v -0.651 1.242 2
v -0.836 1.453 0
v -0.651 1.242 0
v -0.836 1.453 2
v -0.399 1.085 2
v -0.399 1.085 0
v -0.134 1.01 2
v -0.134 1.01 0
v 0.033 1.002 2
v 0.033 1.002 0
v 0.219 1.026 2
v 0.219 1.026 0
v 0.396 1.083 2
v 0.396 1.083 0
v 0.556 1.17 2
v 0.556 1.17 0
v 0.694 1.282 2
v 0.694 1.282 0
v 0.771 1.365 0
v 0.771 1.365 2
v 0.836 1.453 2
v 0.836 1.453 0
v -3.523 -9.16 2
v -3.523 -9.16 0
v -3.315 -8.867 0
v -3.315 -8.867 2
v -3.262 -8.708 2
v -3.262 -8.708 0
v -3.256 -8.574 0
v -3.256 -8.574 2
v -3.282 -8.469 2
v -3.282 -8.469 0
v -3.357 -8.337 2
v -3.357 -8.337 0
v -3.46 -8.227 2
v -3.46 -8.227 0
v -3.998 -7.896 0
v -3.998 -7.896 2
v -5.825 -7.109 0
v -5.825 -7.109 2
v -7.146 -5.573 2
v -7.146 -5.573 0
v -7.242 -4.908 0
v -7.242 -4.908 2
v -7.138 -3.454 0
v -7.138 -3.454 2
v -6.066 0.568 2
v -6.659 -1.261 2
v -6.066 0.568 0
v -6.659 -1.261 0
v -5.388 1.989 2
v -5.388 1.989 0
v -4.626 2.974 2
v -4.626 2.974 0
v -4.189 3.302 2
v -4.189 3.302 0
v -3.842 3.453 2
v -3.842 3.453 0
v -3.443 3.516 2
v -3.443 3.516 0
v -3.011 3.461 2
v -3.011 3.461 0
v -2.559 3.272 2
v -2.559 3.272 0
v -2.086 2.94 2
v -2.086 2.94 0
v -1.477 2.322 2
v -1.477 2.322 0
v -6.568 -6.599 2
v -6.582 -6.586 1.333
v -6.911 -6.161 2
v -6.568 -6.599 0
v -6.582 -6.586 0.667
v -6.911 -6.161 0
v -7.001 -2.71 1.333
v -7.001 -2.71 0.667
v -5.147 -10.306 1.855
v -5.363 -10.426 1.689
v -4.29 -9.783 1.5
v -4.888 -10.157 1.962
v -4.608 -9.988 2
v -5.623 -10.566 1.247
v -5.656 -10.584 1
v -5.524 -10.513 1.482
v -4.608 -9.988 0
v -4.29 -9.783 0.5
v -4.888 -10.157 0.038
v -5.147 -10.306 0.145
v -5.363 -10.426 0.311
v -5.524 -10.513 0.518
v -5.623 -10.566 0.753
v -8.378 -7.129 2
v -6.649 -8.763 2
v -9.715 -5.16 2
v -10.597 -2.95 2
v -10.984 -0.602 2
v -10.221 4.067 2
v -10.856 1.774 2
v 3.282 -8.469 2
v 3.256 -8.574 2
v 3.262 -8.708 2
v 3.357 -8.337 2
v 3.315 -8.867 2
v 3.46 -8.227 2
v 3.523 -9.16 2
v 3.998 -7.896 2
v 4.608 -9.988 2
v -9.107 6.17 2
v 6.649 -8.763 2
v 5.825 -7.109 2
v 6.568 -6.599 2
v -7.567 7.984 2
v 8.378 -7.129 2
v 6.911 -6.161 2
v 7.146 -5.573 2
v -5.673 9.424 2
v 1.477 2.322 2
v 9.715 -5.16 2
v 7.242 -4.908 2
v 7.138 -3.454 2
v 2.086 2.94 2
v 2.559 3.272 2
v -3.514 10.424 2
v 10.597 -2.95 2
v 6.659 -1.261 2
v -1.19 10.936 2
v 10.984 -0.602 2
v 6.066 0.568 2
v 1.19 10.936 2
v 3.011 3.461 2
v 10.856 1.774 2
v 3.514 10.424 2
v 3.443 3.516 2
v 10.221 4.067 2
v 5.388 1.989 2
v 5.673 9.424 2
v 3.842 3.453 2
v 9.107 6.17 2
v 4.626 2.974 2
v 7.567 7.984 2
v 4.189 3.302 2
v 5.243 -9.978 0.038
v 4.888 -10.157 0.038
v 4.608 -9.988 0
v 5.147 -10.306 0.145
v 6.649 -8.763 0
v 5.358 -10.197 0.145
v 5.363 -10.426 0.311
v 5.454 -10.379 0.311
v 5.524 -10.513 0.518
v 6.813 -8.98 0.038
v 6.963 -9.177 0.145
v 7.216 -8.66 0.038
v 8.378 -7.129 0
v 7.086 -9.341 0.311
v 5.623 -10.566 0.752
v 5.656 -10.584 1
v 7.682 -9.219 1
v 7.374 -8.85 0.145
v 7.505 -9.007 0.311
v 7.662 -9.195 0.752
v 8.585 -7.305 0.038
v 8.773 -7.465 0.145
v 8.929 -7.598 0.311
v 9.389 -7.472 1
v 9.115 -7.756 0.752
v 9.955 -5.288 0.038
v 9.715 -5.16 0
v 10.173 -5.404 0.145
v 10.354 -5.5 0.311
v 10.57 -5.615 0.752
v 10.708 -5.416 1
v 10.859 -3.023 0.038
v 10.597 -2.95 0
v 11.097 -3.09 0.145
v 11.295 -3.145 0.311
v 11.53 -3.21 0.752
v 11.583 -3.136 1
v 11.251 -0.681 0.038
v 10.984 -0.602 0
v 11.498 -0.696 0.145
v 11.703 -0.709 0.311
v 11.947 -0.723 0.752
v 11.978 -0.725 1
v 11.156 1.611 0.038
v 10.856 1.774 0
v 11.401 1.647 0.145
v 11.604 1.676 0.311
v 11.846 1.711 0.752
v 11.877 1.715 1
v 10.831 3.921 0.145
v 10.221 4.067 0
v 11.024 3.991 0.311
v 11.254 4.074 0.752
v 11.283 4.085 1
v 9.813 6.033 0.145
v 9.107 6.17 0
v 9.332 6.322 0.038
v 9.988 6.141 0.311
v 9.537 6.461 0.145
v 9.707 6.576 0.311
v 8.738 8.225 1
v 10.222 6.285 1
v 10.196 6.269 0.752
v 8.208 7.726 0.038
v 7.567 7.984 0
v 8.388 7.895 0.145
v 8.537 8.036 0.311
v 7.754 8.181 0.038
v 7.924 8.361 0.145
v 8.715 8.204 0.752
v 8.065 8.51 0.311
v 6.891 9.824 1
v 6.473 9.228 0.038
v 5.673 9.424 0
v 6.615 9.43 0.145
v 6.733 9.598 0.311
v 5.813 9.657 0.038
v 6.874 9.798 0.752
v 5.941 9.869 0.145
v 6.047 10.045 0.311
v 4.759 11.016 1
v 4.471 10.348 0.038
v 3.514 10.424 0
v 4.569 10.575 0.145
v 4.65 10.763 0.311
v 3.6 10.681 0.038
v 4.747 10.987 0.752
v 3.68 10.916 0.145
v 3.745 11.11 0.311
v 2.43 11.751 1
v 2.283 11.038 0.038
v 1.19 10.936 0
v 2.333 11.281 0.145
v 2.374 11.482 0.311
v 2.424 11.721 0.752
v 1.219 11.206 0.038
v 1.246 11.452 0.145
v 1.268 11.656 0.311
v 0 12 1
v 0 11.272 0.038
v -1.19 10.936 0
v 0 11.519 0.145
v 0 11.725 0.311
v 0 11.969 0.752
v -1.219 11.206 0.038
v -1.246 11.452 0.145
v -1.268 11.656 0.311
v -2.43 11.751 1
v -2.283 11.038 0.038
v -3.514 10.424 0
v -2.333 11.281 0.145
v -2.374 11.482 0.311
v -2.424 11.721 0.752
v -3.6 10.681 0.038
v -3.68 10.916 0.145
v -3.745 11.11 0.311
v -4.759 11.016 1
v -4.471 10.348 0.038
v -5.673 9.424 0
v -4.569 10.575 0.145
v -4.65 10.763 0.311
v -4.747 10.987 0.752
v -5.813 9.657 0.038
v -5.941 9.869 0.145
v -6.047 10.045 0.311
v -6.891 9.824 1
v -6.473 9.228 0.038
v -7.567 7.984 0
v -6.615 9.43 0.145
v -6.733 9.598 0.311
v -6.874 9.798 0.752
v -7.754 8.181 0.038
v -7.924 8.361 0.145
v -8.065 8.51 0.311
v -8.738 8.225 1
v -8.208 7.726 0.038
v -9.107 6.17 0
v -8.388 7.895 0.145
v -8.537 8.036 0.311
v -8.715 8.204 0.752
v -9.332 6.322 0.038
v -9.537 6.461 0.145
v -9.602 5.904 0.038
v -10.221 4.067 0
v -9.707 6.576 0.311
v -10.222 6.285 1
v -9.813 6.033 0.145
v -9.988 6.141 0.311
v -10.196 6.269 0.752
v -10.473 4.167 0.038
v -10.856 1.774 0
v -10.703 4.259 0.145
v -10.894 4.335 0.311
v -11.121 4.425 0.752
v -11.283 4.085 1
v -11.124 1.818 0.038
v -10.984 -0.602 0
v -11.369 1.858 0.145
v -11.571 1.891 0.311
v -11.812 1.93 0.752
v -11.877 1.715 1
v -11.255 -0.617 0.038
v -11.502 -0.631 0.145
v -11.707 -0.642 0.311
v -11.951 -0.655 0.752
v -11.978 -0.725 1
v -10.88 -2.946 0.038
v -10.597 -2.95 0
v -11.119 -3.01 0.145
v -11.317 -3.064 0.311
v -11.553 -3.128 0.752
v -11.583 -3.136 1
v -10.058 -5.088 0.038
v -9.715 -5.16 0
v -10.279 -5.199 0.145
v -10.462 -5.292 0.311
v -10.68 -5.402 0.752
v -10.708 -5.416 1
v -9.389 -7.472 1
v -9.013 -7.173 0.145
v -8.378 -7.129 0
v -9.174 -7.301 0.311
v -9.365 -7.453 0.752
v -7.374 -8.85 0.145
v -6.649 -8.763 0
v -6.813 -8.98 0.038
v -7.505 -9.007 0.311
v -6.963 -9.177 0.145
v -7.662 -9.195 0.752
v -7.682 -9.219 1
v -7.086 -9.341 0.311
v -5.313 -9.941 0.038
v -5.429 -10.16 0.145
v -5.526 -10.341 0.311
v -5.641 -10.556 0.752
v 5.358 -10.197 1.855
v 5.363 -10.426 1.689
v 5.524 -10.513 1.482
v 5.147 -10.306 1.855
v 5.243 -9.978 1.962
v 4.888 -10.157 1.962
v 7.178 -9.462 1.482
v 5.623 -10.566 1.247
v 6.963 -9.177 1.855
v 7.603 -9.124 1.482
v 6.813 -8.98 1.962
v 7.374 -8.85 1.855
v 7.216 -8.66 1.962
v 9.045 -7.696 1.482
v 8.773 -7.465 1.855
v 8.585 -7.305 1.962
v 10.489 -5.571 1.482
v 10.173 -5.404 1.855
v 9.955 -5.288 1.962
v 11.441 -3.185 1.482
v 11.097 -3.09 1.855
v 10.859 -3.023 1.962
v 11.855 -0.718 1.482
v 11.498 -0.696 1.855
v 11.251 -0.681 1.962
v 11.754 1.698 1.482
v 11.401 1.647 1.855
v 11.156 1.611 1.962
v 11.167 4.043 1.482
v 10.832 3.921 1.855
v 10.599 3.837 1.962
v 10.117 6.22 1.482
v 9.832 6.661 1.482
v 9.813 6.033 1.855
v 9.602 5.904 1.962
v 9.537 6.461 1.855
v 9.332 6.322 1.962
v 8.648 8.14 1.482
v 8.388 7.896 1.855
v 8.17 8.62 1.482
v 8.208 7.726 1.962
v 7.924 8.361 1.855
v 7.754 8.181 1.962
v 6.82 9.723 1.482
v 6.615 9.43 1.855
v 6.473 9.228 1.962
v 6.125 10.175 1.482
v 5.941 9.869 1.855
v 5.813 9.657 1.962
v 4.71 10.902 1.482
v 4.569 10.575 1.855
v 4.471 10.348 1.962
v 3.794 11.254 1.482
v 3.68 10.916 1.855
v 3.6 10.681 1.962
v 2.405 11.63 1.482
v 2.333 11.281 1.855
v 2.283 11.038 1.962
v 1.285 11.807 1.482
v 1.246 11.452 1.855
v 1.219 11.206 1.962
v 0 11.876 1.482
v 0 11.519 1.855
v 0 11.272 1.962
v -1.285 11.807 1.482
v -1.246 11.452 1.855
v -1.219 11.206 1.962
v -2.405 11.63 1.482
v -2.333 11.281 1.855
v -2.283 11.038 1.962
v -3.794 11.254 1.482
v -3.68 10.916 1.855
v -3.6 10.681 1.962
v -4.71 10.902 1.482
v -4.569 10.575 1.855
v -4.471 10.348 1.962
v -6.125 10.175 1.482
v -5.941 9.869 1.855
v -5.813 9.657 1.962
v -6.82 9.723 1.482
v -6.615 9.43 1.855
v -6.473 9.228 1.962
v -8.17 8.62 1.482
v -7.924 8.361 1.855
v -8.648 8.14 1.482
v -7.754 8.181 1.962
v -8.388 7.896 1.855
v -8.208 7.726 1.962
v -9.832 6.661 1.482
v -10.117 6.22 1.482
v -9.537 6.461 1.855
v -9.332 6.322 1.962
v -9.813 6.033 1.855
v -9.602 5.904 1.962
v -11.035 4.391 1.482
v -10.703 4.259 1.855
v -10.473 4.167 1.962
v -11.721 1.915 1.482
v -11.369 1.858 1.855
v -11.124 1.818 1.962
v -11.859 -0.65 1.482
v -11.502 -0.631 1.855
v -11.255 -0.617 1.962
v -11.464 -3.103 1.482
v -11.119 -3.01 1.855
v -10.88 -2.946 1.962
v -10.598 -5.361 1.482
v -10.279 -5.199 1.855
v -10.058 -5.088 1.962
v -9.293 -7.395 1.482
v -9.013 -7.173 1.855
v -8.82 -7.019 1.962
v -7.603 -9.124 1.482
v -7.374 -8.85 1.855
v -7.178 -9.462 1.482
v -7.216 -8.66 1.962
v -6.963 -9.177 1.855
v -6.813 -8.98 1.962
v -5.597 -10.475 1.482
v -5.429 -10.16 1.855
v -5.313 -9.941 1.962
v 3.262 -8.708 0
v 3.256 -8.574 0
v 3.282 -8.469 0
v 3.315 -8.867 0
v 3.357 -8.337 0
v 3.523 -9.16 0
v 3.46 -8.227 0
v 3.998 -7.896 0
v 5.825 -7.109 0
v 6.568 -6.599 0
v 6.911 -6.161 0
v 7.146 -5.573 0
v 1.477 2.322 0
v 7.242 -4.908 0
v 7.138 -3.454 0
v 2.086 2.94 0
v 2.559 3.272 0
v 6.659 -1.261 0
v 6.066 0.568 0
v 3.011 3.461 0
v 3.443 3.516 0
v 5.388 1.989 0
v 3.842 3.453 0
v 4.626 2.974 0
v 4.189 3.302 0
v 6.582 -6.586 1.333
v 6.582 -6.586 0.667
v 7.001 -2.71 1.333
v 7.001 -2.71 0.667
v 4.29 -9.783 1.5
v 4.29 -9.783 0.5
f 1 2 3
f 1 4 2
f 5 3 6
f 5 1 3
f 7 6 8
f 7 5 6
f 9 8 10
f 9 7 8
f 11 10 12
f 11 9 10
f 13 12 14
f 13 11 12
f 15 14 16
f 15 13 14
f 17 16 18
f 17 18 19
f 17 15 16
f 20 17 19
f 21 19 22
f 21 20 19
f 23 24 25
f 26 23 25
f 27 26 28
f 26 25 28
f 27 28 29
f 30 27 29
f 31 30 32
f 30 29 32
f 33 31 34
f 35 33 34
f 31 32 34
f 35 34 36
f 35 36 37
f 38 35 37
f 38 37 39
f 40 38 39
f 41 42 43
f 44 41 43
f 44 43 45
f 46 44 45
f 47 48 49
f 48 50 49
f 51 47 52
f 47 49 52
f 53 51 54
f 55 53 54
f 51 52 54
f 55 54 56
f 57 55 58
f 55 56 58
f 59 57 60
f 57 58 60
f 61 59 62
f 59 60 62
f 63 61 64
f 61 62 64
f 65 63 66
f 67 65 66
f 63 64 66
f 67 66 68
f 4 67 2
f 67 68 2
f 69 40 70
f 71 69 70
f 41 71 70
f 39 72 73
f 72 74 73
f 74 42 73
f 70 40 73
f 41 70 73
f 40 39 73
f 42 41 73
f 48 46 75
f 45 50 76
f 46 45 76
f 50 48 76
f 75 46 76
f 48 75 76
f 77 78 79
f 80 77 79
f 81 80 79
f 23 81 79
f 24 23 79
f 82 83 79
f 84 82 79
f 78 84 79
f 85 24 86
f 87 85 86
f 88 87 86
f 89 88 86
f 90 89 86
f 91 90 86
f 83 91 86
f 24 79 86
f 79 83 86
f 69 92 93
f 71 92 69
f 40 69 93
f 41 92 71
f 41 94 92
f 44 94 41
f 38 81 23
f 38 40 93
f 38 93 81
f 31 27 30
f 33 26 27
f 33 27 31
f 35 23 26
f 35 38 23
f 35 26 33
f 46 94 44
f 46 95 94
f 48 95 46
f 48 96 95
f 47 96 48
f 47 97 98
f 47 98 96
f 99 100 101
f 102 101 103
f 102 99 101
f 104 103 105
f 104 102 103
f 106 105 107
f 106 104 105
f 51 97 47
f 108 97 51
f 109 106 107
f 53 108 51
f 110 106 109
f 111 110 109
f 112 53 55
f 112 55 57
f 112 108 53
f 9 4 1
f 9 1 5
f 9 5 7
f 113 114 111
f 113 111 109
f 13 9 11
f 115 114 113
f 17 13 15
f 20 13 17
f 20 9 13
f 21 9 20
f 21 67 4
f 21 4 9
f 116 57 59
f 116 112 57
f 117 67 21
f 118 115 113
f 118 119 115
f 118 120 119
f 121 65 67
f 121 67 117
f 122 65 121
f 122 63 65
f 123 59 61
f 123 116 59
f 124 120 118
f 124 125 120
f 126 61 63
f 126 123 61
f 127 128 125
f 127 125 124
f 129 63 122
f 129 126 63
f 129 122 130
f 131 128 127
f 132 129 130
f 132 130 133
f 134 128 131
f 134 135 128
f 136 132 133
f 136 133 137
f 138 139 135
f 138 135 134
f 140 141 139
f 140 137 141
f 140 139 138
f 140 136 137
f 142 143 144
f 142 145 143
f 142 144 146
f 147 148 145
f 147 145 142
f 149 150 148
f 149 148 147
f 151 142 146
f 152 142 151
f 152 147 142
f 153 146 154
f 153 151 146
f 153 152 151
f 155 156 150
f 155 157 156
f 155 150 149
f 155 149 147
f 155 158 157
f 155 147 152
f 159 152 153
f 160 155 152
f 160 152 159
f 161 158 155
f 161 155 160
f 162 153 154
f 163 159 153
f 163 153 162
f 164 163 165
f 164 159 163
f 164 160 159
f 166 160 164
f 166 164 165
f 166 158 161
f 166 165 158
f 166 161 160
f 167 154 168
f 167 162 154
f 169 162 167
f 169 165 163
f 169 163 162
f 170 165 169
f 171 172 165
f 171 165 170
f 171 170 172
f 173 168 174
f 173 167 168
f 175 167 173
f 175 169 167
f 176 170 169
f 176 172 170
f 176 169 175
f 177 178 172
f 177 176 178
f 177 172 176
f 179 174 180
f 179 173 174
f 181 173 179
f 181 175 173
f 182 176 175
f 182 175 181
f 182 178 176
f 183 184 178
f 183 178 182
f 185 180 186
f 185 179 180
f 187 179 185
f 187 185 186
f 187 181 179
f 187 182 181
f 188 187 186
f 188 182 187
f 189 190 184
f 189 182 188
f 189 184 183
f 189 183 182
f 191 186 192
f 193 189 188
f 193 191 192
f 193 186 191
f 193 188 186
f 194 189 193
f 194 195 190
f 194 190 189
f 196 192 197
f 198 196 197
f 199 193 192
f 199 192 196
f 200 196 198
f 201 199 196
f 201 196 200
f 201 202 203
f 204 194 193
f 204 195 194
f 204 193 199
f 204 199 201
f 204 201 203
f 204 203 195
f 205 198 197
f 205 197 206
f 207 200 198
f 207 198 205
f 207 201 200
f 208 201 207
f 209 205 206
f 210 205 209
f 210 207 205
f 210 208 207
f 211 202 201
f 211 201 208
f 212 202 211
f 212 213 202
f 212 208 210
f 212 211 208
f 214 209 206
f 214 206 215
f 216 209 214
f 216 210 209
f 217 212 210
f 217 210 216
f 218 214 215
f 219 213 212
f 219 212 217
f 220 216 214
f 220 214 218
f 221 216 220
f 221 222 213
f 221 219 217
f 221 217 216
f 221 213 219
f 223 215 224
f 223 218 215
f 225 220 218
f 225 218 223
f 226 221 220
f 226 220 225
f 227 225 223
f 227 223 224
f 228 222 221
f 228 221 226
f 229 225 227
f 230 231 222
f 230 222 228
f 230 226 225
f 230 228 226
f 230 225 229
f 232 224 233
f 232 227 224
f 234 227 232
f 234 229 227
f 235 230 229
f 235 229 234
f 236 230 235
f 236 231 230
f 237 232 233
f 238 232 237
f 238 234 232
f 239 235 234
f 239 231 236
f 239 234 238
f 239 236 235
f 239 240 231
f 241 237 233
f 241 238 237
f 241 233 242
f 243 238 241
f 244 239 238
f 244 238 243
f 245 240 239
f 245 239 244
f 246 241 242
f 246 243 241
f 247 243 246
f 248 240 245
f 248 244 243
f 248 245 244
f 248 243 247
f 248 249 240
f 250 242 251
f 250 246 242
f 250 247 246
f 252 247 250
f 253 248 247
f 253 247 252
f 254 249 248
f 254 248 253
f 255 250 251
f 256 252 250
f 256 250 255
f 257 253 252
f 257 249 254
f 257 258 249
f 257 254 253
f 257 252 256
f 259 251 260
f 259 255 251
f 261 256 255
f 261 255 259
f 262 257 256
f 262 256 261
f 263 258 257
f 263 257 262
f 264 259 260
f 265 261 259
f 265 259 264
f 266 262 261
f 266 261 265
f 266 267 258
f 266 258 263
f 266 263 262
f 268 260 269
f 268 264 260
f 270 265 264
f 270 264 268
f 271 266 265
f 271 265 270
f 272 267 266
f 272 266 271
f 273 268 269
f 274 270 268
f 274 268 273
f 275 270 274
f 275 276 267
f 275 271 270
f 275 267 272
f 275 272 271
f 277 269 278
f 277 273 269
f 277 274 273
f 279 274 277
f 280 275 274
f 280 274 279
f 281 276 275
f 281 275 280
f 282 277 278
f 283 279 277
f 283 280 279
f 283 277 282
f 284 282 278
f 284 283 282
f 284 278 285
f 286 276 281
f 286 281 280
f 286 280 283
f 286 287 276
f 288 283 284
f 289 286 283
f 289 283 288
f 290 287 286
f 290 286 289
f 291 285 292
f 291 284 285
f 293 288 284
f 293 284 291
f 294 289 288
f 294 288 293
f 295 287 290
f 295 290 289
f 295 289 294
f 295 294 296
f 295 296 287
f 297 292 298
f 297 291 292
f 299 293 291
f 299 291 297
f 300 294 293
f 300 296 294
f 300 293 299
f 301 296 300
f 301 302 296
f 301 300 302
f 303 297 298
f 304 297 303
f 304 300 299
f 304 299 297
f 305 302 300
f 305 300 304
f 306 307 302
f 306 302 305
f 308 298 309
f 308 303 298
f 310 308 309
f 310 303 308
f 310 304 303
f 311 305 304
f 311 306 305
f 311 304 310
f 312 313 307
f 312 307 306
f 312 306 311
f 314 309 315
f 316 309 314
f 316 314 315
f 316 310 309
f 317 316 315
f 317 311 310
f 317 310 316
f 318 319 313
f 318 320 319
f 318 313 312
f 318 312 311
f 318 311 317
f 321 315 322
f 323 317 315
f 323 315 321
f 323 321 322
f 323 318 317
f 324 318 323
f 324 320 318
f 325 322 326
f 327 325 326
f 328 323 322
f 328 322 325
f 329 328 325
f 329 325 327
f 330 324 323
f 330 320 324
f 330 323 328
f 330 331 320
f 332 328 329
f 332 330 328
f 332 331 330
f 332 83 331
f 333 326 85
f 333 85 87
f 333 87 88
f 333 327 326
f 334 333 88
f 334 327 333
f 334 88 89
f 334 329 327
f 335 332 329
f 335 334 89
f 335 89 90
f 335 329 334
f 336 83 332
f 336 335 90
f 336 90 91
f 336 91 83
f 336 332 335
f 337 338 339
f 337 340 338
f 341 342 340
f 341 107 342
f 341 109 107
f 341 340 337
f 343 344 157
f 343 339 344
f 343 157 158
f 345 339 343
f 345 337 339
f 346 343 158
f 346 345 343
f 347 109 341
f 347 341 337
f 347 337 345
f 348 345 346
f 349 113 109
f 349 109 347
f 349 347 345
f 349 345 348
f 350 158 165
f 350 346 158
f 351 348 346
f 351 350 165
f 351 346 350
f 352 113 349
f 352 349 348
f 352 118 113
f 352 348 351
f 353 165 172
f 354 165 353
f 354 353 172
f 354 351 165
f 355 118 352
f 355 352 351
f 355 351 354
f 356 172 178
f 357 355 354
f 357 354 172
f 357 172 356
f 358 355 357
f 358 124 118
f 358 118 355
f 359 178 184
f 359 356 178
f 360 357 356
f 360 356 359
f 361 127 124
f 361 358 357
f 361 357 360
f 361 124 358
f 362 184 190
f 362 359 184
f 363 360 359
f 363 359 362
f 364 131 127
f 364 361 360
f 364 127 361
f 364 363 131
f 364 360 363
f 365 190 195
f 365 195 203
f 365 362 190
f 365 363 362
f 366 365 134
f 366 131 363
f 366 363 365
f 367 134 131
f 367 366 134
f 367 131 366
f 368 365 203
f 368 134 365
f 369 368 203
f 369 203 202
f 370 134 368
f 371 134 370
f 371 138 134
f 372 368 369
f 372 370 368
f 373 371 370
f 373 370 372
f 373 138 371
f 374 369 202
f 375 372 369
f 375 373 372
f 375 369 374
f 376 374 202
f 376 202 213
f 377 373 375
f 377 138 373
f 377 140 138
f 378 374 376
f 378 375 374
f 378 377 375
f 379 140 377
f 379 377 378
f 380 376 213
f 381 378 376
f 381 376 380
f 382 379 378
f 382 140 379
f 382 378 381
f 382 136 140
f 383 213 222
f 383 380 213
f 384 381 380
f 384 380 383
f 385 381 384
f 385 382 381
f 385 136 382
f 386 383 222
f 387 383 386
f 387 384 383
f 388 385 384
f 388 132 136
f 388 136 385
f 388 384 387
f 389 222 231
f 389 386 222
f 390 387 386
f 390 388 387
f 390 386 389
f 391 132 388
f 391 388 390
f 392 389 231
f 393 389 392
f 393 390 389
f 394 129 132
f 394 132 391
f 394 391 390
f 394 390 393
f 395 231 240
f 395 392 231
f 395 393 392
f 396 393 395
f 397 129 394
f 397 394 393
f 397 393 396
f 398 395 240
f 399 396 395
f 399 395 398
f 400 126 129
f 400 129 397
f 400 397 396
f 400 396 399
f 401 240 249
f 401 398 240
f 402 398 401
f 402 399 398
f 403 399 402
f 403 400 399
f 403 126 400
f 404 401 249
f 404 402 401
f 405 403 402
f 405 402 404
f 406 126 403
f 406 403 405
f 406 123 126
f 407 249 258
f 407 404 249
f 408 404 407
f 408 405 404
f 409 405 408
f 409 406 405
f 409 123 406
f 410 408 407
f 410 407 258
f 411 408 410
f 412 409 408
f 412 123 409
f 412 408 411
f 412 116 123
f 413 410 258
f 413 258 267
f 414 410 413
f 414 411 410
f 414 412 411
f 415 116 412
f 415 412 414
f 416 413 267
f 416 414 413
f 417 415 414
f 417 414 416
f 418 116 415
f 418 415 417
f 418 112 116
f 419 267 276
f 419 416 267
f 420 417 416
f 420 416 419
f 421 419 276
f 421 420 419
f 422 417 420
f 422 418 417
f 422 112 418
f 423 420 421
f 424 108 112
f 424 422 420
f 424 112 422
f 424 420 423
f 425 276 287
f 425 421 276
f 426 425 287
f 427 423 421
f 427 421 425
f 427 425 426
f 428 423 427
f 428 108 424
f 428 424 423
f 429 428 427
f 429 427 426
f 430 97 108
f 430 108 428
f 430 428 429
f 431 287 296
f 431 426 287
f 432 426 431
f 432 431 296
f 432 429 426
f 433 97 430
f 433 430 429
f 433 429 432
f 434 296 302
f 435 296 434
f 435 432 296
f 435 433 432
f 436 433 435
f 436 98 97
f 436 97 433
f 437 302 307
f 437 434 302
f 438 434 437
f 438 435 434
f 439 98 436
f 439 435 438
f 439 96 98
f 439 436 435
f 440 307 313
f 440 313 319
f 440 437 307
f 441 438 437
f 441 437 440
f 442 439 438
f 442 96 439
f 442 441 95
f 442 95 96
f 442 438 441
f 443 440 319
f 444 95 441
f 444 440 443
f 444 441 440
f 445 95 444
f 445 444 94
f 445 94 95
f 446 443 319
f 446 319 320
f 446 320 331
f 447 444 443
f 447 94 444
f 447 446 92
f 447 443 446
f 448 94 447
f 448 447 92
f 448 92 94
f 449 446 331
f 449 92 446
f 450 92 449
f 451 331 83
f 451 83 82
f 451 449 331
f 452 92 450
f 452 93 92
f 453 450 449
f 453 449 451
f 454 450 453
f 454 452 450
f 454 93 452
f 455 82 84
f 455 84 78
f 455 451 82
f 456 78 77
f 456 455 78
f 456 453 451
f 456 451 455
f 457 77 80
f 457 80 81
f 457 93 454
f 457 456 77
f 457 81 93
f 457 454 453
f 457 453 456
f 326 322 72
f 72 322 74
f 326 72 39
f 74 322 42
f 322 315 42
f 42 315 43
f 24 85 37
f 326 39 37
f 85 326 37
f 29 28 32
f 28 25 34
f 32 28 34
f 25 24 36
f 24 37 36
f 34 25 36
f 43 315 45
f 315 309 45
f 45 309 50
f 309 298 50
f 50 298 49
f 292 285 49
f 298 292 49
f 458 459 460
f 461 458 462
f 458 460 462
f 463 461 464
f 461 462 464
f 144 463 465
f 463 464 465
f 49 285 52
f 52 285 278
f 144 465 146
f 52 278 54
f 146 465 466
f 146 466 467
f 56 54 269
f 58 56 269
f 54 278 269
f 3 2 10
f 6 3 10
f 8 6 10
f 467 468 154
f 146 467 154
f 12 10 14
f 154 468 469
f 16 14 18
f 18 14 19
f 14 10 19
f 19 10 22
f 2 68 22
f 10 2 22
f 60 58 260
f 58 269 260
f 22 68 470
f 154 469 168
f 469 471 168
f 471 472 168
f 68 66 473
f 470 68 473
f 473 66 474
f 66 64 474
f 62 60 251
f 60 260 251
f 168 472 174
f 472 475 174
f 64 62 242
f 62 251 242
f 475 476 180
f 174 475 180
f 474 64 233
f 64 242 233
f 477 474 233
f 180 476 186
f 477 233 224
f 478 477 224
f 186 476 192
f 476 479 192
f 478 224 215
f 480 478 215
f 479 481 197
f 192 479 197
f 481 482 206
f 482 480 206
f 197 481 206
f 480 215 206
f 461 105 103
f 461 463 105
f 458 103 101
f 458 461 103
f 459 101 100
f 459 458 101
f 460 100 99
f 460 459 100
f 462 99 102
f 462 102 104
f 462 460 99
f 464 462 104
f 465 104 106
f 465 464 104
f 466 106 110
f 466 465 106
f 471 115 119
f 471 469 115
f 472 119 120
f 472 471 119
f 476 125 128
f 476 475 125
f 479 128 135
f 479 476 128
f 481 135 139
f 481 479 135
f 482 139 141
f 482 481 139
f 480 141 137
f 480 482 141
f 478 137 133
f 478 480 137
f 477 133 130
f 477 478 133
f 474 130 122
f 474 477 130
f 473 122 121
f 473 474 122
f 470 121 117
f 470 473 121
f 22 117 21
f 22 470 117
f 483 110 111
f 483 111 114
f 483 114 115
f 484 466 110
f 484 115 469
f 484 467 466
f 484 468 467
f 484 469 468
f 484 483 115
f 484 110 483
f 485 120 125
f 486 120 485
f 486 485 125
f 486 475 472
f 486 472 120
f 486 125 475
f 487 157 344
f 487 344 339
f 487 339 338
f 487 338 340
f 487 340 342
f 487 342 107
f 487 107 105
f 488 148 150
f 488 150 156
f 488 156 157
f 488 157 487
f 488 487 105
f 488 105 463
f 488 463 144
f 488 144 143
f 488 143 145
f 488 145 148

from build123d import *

# Parameters (mm, degrees)
SALIENTE_EXTRUIR1_DEPTH = 2
REDONDEO1_R             = 1
REDONDEO2_R             = 1


with BuildPart() as part:
    # Croquis1 → Saliente-Extruir1 (new body)
    with BuildSketch(Plane.XY):
        with BuildLine():
            ThreePointArc((5.655764002, -10.583587934), (0, 12), (-5.655764002, -10.583587934))
            add(Edge.make_bspline(
                [(-5.655764002, -10.583587934), (-0.474469774, -7.833786927), (-7.753192635, -8.222412063), (-6.809703352, 0.322044678), (-3.659798819, 7.117432674), (0, 0)],
                knots=[0, 0, 0, 0, 0.294178074, 0.466965283, 1, 1, 1, 1], degree=3))
            add(Edge.make_bspline(
                [(5.655764002, -10.583587934), (0.474469774, -7.833786927), (7.753192635, -8.222412063), (6.809703352, 0.322044678), (3.659798819, 7.117432674), (0, 0)],
                knots=[0, 0, 0, 0, 0.294178074, 0.466965283, 1, 1, 1, 1], degree=3))
        make_face()
    extrude(amount=SALIENTE_EXTRUIR1_DEPTH)

    # Redondeo1
    redondeo1_edges = [part.edges().sort_by_distance(p)[0] for p in [
        (0, 0, 1),
    ]]
    fillet(redondeo1_edges, radius=REDONDEO1_R)

    # Redondeo2
    redondeo2_edges = [part.edges().sort_by_distance(p)[0] for p in [
        (0, 12, 2),
        (0, 12, 0),
    ]]
    fillet(redondeo2_edges, radius=REDONDEO2_R - 0.0001)  # a hair under: the kernel refuses the full size


solid = part.part
